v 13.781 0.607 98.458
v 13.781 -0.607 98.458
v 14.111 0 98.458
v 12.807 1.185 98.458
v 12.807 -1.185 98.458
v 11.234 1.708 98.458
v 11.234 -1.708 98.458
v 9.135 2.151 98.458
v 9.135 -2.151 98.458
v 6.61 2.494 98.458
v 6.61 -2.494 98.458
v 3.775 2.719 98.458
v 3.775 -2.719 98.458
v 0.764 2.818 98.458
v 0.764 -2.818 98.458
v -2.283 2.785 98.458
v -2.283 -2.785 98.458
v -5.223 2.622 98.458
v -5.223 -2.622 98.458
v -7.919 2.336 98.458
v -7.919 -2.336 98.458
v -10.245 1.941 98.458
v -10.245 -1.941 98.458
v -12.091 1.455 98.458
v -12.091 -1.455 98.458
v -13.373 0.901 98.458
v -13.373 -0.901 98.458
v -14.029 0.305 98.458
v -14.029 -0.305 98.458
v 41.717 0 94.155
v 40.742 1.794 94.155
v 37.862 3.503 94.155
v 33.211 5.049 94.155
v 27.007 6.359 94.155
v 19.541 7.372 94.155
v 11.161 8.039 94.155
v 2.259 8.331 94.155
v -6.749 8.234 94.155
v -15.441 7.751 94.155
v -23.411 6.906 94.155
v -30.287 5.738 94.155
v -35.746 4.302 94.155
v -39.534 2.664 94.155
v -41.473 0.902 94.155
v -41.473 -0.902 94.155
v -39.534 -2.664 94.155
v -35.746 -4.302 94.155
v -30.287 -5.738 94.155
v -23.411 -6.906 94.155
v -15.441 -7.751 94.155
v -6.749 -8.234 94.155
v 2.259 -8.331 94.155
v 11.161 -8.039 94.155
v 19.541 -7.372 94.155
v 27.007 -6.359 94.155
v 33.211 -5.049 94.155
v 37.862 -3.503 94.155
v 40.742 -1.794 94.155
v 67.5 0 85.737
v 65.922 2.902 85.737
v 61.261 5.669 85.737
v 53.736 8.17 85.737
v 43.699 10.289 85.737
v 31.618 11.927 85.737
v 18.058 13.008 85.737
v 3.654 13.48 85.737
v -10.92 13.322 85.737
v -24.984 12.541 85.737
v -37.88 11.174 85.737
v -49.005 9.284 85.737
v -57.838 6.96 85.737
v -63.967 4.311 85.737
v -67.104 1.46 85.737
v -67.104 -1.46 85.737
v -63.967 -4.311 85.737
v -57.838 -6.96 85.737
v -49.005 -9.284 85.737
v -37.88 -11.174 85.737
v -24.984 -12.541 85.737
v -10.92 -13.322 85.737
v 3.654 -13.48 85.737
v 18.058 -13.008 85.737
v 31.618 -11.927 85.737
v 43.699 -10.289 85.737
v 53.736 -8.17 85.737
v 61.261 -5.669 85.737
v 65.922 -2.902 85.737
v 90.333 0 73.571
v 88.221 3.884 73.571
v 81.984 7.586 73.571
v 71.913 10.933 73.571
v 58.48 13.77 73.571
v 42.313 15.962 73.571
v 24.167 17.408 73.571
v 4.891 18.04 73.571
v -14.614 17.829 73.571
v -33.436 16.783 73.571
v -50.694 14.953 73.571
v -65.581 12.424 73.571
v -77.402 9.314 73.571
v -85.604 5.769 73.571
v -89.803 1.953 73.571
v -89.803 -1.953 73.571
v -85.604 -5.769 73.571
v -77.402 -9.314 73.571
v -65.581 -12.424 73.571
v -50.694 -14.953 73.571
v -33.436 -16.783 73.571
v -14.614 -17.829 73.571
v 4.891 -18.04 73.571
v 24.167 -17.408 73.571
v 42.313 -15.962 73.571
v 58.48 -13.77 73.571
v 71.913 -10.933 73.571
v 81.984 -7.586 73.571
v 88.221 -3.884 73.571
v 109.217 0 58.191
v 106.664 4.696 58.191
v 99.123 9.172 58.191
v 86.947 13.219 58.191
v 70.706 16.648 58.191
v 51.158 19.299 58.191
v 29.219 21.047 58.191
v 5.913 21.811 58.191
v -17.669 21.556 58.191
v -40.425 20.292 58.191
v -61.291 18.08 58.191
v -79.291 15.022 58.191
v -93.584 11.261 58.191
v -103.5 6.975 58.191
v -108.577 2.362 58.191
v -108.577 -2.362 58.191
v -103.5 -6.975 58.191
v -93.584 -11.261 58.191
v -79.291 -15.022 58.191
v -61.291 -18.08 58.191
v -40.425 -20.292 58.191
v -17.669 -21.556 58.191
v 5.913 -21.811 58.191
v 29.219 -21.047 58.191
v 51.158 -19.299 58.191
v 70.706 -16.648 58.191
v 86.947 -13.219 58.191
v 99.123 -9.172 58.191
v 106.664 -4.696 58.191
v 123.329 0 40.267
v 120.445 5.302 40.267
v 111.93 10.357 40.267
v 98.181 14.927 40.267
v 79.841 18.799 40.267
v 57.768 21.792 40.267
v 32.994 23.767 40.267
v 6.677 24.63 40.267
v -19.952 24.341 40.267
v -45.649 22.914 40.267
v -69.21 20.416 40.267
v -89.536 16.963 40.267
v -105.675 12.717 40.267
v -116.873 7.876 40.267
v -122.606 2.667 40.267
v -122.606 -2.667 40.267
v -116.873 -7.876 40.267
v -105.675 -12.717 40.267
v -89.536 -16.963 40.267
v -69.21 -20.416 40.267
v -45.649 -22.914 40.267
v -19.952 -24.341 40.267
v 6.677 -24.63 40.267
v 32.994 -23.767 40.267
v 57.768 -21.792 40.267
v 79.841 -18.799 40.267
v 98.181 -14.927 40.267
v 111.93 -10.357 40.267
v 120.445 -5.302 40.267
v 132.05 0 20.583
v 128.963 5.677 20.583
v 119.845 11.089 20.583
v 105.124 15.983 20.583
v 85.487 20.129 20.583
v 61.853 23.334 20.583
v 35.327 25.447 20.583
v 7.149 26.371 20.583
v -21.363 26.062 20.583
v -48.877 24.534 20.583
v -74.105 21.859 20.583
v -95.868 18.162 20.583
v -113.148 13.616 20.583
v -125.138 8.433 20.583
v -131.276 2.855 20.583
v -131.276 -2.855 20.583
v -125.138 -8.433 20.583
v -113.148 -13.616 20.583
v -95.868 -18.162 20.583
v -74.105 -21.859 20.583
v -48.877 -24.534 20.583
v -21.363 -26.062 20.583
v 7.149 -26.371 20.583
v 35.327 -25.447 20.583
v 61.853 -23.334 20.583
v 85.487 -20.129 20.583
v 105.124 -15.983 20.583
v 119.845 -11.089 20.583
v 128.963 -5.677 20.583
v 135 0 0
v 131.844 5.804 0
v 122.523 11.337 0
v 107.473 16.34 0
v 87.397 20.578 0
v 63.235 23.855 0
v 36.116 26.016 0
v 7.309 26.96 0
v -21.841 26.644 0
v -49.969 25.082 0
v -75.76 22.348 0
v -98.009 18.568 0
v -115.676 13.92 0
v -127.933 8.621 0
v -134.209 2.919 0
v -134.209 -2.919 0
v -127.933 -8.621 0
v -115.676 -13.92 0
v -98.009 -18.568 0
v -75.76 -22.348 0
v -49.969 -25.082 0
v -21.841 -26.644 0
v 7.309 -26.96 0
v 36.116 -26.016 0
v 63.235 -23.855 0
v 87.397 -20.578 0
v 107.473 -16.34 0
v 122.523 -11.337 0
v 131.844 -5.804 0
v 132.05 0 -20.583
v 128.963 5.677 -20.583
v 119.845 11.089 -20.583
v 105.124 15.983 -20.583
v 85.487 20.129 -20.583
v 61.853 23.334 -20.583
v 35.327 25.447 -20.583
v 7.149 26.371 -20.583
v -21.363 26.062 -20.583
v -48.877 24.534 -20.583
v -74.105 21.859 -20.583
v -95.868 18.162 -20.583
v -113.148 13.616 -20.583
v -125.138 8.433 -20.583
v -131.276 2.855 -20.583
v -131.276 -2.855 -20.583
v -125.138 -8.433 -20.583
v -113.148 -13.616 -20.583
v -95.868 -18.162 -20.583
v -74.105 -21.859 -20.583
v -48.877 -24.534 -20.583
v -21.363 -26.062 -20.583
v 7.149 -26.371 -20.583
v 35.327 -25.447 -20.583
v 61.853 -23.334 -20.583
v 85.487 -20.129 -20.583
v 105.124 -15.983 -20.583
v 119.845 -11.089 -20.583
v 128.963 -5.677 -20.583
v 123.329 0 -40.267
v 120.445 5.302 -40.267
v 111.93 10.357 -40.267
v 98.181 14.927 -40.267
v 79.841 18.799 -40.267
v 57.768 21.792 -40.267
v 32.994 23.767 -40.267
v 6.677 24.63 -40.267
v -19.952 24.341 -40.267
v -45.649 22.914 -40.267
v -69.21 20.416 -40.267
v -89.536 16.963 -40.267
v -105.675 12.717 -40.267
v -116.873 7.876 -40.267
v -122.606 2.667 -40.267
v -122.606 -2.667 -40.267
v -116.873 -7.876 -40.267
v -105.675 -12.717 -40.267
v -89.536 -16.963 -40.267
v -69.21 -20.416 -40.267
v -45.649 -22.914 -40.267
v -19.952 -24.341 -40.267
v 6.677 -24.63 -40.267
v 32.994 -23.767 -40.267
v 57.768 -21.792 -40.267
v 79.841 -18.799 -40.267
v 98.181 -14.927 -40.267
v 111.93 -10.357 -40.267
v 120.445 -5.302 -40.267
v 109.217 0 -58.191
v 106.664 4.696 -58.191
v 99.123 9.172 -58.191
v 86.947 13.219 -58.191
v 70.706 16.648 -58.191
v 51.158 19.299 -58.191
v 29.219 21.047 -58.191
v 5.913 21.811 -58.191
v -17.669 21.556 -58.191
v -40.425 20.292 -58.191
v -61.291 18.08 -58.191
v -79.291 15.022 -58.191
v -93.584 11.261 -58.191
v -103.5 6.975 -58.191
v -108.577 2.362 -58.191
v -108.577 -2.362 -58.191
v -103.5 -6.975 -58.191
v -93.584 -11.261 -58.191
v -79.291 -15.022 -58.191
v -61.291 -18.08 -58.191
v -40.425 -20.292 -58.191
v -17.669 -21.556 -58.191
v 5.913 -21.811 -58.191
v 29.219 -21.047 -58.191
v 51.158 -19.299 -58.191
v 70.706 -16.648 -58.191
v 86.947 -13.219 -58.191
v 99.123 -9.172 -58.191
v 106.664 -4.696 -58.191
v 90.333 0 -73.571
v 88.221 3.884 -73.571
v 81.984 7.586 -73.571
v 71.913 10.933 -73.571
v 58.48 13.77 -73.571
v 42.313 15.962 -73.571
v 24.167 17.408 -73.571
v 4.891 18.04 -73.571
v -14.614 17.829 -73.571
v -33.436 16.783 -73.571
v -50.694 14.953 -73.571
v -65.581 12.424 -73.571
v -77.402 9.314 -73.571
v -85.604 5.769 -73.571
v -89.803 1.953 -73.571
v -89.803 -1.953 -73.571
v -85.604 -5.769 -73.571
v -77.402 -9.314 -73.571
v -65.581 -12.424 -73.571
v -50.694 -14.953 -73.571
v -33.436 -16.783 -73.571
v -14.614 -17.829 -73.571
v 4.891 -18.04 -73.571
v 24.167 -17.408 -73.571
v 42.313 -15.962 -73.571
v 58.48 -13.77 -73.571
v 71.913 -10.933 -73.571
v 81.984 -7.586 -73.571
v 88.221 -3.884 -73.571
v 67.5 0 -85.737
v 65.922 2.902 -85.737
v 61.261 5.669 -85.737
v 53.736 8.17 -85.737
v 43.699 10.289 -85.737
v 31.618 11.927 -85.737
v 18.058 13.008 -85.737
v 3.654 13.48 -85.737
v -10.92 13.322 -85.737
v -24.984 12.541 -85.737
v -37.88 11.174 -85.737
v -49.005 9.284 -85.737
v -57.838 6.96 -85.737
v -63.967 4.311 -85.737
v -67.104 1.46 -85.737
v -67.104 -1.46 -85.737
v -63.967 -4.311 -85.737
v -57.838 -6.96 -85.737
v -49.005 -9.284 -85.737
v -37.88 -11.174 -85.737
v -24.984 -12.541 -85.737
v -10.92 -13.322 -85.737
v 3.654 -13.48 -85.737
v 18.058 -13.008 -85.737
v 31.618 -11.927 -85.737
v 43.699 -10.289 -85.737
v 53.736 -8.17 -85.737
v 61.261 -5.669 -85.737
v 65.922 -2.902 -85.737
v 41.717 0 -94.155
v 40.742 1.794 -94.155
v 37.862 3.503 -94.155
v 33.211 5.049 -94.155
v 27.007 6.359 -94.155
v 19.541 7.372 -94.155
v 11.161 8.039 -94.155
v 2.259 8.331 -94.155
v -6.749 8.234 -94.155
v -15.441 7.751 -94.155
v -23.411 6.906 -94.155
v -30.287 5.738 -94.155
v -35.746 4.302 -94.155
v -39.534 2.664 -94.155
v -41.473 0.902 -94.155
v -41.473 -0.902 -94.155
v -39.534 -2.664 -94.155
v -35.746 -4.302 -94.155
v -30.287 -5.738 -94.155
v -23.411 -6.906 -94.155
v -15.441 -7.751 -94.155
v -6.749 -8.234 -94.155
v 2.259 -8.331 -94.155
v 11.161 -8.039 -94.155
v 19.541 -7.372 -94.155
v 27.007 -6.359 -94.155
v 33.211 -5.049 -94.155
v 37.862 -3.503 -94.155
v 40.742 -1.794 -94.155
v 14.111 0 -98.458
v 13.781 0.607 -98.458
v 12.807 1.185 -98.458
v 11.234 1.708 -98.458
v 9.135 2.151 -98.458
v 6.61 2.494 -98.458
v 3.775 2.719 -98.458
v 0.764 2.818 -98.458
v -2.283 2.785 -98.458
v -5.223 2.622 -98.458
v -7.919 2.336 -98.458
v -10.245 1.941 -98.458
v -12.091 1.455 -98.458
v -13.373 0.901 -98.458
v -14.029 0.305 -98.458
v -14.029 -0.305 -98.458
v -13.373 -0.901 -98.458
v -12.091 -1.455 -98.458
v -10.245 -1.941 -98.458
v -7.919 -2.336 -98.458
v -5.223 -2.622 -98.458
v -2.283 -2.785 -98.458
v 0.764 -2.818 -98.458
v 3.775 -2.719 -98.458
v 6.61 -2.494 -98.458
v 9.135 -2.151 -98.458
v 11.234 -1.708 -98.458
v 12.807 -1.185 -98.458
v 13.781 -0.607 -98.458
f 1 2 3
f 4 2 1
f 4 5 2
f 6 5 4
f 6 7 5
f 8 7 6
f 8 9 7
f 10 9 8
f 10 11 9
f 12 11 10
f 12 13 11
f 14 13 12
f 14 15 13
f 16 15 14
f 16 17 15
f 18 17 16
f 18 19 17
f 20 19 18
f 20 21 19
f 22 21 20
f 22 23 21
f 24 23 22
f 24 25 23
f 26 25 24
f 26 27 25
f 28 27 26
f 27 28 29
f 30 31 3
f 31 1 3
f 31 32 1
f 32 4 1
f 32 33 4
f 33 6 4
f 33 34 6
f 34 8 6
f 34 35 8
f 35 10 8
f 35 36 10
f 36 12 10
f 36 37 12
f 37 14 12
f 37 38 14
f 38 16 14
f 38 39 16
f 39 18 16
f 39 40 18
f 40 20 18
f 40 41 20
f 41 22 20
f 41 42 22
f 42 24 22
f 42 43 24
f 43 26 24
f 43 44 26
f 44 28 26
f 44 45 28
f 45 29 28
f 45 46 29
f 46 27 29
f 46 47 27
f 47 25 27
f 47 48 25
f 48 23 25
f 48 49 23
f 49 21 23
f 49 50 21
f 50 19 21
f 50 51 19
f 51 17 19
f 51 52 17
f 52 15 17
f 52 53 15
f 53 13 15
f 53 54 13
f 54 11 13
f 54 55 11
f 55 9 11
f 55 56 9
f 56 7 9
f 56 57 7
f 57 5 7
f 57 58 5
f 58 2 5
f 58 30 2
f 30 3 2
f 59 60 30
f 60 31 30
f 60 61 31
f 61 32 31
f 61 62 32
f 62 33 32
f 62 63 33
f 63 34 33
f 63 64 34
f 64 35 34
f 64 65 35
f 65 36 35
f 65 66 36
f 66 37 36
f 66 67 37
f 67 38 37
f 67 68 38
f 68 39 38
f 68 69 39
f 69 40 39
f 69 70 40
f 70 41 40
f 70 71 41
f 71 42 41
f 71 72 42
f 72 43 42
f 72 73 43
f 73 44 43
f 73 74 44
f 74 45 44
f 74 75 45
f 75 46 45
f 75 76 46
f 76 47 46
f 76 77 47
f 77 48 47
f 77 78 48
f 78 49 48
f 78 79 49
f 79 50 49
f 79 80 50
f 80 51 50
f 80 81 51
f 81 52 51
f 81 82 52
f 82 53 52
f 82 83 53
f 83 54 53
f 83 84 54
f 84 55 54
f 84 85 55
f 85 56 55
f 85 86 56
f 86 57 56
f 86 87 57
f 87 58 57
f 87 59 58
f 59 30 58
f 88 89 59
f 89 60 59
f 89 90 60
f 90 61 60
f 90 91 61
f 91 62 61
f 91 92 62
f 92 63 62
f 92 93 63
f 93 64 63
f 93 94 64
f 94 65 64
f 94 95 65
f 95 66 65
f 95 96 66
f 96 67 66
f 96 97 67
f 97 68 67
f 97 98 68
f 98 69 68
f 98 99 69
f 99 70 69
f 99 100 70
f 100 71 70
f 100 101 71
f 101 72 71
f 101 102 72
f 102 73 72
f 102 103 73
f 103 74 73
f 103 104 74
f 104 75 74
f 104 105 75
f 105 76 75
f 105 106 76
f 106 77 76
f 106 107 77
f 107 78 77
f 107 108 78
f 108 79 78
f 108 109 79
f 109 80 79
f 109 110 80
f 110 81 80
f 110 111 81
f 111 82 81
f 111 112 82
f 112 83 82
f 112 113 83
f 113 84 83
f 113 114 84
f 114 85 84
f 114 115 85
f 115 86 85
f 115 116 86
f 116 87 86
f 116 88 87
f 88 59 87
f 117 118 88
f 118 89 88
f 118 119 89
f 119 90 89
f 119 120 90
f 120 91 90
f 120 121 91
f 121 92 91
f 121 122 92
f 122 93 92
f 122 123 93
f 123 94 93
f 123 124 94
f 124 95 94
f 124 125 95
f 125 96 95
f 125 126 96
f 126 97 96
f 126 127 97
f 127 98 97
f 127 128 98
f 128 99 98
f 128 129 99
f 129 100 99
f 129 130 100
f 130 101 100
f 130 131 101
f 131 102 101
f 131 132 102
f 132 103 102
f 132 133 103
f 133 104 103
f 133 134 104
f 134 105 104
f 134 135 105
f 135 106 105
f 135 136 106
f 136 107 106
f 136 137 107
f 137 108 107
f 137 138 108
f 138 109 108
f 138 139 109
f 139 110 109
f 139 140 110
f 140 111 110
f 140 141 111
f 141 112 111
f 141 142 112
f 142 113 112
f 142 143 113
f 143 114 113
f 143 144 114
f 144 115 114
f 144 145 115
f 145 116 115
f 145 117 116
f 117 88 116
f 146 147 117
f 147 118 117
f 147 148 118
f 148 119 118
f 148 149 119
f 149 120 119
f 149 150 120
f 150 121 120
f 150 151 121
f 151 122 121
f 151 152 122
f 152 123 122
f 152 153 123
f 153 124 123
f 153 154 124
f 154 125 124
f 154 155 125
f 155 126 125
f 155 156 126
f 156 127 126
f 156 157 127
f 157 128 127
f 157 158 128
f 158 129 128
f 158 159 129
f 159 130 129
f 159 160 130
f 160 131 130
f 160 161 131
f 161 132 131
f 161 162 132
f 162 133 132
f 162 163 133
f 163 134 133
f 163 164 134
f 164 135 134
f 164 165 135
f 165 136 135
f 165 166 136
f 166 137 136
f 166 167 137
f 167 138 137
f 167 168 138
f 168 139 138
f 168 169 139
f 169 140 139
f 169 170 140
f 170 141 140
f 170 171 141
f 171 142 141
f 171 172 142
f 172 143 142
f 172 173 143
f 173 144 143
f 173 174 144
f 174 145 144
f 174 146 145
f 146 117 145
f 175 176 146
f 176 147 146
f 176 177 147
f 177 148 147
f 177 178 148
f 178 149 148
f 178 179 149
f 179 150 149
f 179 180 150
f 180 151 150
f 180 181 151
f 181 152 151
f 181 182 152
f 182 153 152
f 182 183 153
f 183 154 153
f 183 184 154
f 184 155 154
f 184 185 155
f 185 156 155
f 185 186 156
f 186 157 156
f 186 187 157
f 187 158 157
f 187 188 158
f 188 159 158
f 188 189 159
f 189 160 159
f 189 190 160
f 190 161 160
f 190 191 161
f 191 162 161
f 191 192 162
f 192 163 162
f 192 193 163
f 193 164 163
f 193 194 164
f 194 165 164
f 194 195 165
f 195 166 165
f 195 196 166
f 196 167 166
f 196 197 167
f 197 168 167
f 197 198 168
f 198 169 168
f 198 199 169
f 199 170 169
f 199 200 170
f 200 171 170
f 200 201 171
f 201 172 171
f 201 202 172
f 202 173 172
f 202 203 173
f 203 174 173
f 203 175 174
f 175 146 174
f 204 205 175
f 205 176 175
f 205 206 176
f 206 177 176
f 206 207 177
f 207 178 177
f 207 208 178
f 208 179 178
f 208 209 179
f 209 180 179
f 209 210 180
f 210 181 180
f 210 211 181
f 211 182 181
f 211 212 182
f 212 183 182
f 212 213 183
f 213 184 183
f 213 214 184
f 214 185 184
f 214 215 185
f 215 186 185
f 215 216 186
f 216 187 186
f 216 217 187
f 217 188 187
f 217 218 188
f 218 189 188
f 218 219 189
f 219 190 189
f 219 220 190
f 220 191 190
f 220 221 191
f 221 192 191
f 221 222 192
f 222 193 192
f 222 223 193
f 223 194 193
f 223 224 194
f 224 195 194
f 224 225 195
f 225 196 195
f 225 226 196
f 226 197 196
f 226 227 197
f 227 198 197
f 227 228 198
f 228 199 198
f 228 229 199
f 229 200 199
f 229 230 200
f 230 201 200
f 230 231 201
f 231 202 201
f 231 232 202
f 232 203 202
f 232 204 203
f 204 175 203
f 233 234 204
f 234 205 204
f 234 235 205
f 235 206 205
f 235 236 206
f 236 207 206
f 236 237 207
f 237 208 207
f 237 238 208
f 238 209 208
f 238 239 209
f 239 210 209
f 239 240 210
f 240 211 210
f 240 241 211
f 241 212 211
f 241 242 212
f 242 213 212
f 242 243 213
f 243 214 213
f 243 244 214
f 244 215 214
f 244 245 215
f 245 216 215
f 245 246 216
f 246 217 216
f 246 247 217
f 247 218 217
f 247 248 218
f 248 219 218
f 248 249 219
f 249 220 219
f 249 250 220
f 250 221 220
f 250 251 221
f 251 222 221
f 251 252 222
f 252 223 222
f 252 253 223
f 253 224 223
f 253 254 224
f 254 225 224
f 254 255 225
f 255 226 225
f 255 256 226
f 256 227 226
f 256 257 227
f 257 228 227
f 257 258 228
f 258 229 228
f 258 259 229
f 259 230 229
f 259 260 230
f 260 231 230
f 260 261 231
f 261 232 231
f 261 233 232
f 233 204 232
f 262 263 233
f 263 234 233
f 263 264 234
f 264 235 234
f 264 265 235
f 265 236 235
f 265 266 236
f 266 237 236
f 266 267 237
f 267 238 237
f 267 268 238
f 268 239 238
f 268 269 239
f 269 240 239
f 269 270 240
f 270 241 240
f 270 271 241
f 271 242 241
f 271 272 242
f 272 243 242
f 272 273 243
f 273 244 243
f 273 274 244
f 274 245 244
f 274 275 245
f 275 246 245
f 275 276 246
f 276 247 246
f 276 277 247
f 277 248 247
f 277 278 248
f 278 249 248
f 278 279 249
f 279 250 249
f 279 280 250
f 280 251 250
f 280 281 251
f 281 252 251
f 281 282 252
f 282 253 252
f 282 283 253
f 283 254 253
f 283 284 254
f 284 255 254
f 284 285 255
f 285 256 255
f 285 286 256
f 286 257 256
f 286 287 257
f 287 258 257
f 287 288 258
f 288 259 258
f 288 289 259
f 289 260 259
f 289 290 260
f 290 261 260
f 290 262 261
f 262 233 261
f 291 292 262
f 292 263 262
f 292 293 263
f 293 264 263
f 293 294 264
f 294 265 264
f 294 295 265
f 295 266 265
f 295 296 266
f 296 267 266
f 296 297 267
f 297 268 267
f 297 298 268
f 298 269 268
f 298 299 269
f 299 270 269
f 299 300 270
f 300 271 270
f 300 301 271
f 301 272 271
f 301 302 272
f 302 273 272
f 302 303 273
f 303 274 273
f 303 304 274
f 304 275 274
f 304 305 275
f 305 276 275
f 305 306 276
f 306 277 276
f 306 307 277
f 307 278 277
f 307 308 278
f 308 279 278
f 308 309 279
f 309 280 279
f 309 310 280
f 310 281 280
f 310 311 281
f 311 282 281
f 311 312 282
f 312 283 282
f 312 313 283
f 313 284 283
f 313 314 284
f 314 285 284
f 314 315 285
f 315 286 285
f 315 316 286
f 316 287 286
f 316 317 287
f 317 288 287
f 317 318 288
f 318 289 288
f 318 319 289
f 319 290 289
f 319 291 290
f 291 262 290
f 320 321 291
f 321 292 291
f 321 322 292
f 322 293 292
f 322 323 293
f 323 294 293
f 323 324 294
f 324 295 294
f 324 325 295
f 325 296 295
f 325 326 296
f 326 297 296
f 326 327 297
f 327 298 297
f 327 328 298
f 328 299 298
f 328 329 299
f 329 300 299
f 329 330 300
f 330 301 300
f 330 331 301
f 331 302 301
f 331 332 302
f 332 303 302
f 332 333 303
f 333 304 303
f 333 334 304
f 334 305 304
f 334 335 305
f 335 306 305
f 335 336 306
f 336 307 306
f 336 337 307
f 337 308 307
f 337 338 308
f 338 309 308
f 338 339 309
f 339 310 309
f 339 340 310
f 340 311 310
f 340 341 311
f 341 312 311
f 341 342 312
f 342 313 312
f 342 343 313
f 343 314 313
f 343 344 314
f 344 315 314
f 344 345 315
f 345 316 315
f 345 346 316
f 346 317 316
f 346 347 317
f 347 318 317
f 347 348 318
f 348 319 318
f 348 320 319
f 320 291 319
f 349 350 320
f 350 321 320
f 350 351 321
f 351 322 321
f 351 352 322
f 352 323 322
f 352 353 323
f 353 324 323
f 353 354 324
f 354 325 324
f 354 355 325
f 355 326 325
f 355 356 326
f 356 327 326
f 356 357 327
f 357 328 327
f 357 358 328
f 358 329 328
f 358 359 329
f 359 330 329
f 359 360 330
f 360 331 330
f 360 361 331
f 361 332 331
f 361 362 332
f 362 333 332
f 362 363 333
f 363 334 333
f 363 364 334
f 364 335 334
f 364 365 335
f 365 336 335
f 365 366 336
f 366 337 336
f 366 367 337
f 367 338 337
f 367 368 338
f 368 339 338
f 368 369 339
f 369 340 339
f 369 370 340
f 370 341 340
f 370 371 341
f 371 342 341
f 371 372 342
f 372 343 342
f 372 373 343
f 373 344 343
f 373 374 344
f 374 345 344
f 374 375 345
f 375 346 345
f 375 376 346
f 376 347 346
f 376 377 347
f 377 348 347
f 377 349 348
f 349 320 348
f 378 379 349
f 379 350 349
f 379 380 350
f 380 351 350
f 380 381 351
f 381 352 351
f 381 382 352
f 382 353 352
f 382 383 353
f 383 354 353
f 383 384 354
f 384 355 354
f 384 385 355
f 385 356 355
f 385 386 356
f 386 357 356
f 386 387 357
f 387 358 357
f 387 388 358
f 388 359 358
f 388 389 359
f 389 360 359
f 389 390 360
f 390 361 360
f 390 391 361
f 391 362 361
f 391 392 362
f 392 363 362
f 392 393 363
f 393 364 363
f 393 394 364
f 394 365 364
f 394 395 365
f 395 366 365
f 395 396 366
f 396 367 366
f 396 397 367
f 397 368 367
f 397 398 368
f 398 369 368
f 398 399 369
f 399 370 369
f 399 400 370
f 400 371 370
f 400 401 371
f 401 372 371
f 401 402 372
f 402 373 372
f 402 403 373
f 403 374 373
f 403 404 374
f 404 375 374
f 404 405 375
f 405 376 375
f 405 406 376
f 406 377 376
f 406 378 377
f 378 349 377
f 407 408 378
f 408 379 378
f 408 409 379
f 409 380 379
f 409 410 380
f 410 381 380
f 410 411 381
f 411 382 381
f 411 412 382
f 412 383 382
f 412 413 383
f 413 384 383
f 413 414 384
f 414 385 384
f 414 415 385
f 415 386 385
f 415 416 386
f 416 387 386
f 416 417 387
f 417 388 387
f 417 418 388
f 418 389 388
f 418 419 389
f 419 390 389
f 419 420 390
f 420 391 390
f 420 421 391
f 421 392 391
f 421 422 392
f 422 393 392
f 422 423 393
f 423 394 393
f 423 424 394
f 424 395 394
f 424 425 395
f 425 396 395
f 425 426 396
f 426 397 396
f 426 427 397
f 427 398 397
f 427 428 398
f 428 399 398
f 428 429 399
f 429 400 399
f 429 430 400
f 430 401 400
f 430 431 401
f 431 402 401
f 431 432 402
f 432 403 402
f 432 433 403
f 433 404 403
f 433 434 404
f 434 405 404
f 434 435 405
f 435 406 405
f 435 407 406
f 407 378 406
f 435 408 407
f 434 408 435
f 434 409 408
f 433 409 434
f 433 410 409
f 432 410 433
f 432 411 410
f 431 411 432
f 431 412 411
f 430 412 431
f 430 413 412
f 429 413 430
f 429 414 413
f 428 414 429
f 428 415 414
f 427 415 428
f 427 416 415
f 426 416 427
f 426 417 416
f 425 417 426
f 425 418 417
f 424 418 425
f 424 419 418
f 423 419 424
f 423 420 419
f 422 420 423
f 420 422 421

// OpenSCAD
// Generated by SolidPython 1.0.1 on 2020-07-29 00:46:51


scale(v = [15, 3, 11]) {
	sphere(r = 9);
}
/***********************************************
*********      SolidPython code:      **********
************************************************
 
# import packages: SolidPython
from solid import *
from solid.utils import *
from itertools import chain, combinations, permutations


class Resize:

    def __init__(self, scad_file):
        self.scad_file = scad_file
        #self.scad_file = import_scad(scad_file)
        # cone/cylinder param:
        self.r1 = 0
        self.r2 = 0
        self.h = 0
        # rectangular prism param:
        self.w = 0
        self.l = 0
        # ellipse param:
        self.r = 0

    # import OpenScad code (file name corresponds to shape)


    # classify shape + parameters
    def assign(self, param1, param2, param3):
        if self.scad_file == 'cone.scad':
            self.r1 = param1
            self.r2 = param2
            self.h = param3
        elif self.scad_file == 'cylinder.scad':
            self.r1 = param1
            self.r2 = param2
            self.h = param3
        elif self.scad_file == 'rectangularPrism.scad':
            self.h = param1
            self.l = param2
            self.w = param3
        else:
            self.r = param1
            self.h = param2

    # resize parameters
    def iterate(self):
        x = range(3, 20, 2)
        i = 1
        if self.scad_file == 'cone.scad':
            tempList = list(permutations(x, 2))
            for temp in tempList:
                param1 = temp[0]
                param2 = temp[1]
                filepath = 'produced_scad_files/' + 'cone' + str(param1) + '_' + str(param2) + '_' + '.scad'
                scad_render_to_file(cylinder(h=param1, r1=param2, r2=0), filepath)

        elif self.scad_file == 'cylinder.scad':
            tempList = list(permutations(x, 3))
            for temp in tempList:
                param1 = temp[0]
                param2 = temp[1]
                filepath = 'produced_scad_files/' + 'cylinder' + str(param1) + '_' + str(param2) + '_' + '.scad'
                scad_render_to_file(cylinder(h=param1, r1=param2, r2=param2), filepath)

        elif self.scad_file == 'rectangularPrism.scad':
            tempList = list(permutations(x, 3))
            for temp in tempList:
                param1 = temp[0]
                param2 = temp[1]
                param3 = temp[2]
                filepath = 'produced_scad_files/' + 'rectangularPrism' + str(param1) + '_' + str(param2) + '_' + str(
                    param3) + '.scad'
                scad_render_to_file(cube(size=(param1, param2, param3)), filepath)

        elif self.scad_file == 'ellipse.scad':
            tempList = list(permutations(x, 4))
            for temp in tempList:
                param1 = temp[0]
                param2 = temp[1]
                param3 = temp[2]
                param4 = temp[3]
                filepath = 'produced_scad_files/' + 'ellipse' + str(param1) + '_' + str(param2) + '_' + str(param3) + '_' + str(param4) + '.scad'
                scad_render_to_file(scale([param1, param2, param3])(sphere(r=param4)), filepath)

    def render_to_scadfile(self):
        scad_render_to_file(scad, 'example.scad') 
 
************************************************/
